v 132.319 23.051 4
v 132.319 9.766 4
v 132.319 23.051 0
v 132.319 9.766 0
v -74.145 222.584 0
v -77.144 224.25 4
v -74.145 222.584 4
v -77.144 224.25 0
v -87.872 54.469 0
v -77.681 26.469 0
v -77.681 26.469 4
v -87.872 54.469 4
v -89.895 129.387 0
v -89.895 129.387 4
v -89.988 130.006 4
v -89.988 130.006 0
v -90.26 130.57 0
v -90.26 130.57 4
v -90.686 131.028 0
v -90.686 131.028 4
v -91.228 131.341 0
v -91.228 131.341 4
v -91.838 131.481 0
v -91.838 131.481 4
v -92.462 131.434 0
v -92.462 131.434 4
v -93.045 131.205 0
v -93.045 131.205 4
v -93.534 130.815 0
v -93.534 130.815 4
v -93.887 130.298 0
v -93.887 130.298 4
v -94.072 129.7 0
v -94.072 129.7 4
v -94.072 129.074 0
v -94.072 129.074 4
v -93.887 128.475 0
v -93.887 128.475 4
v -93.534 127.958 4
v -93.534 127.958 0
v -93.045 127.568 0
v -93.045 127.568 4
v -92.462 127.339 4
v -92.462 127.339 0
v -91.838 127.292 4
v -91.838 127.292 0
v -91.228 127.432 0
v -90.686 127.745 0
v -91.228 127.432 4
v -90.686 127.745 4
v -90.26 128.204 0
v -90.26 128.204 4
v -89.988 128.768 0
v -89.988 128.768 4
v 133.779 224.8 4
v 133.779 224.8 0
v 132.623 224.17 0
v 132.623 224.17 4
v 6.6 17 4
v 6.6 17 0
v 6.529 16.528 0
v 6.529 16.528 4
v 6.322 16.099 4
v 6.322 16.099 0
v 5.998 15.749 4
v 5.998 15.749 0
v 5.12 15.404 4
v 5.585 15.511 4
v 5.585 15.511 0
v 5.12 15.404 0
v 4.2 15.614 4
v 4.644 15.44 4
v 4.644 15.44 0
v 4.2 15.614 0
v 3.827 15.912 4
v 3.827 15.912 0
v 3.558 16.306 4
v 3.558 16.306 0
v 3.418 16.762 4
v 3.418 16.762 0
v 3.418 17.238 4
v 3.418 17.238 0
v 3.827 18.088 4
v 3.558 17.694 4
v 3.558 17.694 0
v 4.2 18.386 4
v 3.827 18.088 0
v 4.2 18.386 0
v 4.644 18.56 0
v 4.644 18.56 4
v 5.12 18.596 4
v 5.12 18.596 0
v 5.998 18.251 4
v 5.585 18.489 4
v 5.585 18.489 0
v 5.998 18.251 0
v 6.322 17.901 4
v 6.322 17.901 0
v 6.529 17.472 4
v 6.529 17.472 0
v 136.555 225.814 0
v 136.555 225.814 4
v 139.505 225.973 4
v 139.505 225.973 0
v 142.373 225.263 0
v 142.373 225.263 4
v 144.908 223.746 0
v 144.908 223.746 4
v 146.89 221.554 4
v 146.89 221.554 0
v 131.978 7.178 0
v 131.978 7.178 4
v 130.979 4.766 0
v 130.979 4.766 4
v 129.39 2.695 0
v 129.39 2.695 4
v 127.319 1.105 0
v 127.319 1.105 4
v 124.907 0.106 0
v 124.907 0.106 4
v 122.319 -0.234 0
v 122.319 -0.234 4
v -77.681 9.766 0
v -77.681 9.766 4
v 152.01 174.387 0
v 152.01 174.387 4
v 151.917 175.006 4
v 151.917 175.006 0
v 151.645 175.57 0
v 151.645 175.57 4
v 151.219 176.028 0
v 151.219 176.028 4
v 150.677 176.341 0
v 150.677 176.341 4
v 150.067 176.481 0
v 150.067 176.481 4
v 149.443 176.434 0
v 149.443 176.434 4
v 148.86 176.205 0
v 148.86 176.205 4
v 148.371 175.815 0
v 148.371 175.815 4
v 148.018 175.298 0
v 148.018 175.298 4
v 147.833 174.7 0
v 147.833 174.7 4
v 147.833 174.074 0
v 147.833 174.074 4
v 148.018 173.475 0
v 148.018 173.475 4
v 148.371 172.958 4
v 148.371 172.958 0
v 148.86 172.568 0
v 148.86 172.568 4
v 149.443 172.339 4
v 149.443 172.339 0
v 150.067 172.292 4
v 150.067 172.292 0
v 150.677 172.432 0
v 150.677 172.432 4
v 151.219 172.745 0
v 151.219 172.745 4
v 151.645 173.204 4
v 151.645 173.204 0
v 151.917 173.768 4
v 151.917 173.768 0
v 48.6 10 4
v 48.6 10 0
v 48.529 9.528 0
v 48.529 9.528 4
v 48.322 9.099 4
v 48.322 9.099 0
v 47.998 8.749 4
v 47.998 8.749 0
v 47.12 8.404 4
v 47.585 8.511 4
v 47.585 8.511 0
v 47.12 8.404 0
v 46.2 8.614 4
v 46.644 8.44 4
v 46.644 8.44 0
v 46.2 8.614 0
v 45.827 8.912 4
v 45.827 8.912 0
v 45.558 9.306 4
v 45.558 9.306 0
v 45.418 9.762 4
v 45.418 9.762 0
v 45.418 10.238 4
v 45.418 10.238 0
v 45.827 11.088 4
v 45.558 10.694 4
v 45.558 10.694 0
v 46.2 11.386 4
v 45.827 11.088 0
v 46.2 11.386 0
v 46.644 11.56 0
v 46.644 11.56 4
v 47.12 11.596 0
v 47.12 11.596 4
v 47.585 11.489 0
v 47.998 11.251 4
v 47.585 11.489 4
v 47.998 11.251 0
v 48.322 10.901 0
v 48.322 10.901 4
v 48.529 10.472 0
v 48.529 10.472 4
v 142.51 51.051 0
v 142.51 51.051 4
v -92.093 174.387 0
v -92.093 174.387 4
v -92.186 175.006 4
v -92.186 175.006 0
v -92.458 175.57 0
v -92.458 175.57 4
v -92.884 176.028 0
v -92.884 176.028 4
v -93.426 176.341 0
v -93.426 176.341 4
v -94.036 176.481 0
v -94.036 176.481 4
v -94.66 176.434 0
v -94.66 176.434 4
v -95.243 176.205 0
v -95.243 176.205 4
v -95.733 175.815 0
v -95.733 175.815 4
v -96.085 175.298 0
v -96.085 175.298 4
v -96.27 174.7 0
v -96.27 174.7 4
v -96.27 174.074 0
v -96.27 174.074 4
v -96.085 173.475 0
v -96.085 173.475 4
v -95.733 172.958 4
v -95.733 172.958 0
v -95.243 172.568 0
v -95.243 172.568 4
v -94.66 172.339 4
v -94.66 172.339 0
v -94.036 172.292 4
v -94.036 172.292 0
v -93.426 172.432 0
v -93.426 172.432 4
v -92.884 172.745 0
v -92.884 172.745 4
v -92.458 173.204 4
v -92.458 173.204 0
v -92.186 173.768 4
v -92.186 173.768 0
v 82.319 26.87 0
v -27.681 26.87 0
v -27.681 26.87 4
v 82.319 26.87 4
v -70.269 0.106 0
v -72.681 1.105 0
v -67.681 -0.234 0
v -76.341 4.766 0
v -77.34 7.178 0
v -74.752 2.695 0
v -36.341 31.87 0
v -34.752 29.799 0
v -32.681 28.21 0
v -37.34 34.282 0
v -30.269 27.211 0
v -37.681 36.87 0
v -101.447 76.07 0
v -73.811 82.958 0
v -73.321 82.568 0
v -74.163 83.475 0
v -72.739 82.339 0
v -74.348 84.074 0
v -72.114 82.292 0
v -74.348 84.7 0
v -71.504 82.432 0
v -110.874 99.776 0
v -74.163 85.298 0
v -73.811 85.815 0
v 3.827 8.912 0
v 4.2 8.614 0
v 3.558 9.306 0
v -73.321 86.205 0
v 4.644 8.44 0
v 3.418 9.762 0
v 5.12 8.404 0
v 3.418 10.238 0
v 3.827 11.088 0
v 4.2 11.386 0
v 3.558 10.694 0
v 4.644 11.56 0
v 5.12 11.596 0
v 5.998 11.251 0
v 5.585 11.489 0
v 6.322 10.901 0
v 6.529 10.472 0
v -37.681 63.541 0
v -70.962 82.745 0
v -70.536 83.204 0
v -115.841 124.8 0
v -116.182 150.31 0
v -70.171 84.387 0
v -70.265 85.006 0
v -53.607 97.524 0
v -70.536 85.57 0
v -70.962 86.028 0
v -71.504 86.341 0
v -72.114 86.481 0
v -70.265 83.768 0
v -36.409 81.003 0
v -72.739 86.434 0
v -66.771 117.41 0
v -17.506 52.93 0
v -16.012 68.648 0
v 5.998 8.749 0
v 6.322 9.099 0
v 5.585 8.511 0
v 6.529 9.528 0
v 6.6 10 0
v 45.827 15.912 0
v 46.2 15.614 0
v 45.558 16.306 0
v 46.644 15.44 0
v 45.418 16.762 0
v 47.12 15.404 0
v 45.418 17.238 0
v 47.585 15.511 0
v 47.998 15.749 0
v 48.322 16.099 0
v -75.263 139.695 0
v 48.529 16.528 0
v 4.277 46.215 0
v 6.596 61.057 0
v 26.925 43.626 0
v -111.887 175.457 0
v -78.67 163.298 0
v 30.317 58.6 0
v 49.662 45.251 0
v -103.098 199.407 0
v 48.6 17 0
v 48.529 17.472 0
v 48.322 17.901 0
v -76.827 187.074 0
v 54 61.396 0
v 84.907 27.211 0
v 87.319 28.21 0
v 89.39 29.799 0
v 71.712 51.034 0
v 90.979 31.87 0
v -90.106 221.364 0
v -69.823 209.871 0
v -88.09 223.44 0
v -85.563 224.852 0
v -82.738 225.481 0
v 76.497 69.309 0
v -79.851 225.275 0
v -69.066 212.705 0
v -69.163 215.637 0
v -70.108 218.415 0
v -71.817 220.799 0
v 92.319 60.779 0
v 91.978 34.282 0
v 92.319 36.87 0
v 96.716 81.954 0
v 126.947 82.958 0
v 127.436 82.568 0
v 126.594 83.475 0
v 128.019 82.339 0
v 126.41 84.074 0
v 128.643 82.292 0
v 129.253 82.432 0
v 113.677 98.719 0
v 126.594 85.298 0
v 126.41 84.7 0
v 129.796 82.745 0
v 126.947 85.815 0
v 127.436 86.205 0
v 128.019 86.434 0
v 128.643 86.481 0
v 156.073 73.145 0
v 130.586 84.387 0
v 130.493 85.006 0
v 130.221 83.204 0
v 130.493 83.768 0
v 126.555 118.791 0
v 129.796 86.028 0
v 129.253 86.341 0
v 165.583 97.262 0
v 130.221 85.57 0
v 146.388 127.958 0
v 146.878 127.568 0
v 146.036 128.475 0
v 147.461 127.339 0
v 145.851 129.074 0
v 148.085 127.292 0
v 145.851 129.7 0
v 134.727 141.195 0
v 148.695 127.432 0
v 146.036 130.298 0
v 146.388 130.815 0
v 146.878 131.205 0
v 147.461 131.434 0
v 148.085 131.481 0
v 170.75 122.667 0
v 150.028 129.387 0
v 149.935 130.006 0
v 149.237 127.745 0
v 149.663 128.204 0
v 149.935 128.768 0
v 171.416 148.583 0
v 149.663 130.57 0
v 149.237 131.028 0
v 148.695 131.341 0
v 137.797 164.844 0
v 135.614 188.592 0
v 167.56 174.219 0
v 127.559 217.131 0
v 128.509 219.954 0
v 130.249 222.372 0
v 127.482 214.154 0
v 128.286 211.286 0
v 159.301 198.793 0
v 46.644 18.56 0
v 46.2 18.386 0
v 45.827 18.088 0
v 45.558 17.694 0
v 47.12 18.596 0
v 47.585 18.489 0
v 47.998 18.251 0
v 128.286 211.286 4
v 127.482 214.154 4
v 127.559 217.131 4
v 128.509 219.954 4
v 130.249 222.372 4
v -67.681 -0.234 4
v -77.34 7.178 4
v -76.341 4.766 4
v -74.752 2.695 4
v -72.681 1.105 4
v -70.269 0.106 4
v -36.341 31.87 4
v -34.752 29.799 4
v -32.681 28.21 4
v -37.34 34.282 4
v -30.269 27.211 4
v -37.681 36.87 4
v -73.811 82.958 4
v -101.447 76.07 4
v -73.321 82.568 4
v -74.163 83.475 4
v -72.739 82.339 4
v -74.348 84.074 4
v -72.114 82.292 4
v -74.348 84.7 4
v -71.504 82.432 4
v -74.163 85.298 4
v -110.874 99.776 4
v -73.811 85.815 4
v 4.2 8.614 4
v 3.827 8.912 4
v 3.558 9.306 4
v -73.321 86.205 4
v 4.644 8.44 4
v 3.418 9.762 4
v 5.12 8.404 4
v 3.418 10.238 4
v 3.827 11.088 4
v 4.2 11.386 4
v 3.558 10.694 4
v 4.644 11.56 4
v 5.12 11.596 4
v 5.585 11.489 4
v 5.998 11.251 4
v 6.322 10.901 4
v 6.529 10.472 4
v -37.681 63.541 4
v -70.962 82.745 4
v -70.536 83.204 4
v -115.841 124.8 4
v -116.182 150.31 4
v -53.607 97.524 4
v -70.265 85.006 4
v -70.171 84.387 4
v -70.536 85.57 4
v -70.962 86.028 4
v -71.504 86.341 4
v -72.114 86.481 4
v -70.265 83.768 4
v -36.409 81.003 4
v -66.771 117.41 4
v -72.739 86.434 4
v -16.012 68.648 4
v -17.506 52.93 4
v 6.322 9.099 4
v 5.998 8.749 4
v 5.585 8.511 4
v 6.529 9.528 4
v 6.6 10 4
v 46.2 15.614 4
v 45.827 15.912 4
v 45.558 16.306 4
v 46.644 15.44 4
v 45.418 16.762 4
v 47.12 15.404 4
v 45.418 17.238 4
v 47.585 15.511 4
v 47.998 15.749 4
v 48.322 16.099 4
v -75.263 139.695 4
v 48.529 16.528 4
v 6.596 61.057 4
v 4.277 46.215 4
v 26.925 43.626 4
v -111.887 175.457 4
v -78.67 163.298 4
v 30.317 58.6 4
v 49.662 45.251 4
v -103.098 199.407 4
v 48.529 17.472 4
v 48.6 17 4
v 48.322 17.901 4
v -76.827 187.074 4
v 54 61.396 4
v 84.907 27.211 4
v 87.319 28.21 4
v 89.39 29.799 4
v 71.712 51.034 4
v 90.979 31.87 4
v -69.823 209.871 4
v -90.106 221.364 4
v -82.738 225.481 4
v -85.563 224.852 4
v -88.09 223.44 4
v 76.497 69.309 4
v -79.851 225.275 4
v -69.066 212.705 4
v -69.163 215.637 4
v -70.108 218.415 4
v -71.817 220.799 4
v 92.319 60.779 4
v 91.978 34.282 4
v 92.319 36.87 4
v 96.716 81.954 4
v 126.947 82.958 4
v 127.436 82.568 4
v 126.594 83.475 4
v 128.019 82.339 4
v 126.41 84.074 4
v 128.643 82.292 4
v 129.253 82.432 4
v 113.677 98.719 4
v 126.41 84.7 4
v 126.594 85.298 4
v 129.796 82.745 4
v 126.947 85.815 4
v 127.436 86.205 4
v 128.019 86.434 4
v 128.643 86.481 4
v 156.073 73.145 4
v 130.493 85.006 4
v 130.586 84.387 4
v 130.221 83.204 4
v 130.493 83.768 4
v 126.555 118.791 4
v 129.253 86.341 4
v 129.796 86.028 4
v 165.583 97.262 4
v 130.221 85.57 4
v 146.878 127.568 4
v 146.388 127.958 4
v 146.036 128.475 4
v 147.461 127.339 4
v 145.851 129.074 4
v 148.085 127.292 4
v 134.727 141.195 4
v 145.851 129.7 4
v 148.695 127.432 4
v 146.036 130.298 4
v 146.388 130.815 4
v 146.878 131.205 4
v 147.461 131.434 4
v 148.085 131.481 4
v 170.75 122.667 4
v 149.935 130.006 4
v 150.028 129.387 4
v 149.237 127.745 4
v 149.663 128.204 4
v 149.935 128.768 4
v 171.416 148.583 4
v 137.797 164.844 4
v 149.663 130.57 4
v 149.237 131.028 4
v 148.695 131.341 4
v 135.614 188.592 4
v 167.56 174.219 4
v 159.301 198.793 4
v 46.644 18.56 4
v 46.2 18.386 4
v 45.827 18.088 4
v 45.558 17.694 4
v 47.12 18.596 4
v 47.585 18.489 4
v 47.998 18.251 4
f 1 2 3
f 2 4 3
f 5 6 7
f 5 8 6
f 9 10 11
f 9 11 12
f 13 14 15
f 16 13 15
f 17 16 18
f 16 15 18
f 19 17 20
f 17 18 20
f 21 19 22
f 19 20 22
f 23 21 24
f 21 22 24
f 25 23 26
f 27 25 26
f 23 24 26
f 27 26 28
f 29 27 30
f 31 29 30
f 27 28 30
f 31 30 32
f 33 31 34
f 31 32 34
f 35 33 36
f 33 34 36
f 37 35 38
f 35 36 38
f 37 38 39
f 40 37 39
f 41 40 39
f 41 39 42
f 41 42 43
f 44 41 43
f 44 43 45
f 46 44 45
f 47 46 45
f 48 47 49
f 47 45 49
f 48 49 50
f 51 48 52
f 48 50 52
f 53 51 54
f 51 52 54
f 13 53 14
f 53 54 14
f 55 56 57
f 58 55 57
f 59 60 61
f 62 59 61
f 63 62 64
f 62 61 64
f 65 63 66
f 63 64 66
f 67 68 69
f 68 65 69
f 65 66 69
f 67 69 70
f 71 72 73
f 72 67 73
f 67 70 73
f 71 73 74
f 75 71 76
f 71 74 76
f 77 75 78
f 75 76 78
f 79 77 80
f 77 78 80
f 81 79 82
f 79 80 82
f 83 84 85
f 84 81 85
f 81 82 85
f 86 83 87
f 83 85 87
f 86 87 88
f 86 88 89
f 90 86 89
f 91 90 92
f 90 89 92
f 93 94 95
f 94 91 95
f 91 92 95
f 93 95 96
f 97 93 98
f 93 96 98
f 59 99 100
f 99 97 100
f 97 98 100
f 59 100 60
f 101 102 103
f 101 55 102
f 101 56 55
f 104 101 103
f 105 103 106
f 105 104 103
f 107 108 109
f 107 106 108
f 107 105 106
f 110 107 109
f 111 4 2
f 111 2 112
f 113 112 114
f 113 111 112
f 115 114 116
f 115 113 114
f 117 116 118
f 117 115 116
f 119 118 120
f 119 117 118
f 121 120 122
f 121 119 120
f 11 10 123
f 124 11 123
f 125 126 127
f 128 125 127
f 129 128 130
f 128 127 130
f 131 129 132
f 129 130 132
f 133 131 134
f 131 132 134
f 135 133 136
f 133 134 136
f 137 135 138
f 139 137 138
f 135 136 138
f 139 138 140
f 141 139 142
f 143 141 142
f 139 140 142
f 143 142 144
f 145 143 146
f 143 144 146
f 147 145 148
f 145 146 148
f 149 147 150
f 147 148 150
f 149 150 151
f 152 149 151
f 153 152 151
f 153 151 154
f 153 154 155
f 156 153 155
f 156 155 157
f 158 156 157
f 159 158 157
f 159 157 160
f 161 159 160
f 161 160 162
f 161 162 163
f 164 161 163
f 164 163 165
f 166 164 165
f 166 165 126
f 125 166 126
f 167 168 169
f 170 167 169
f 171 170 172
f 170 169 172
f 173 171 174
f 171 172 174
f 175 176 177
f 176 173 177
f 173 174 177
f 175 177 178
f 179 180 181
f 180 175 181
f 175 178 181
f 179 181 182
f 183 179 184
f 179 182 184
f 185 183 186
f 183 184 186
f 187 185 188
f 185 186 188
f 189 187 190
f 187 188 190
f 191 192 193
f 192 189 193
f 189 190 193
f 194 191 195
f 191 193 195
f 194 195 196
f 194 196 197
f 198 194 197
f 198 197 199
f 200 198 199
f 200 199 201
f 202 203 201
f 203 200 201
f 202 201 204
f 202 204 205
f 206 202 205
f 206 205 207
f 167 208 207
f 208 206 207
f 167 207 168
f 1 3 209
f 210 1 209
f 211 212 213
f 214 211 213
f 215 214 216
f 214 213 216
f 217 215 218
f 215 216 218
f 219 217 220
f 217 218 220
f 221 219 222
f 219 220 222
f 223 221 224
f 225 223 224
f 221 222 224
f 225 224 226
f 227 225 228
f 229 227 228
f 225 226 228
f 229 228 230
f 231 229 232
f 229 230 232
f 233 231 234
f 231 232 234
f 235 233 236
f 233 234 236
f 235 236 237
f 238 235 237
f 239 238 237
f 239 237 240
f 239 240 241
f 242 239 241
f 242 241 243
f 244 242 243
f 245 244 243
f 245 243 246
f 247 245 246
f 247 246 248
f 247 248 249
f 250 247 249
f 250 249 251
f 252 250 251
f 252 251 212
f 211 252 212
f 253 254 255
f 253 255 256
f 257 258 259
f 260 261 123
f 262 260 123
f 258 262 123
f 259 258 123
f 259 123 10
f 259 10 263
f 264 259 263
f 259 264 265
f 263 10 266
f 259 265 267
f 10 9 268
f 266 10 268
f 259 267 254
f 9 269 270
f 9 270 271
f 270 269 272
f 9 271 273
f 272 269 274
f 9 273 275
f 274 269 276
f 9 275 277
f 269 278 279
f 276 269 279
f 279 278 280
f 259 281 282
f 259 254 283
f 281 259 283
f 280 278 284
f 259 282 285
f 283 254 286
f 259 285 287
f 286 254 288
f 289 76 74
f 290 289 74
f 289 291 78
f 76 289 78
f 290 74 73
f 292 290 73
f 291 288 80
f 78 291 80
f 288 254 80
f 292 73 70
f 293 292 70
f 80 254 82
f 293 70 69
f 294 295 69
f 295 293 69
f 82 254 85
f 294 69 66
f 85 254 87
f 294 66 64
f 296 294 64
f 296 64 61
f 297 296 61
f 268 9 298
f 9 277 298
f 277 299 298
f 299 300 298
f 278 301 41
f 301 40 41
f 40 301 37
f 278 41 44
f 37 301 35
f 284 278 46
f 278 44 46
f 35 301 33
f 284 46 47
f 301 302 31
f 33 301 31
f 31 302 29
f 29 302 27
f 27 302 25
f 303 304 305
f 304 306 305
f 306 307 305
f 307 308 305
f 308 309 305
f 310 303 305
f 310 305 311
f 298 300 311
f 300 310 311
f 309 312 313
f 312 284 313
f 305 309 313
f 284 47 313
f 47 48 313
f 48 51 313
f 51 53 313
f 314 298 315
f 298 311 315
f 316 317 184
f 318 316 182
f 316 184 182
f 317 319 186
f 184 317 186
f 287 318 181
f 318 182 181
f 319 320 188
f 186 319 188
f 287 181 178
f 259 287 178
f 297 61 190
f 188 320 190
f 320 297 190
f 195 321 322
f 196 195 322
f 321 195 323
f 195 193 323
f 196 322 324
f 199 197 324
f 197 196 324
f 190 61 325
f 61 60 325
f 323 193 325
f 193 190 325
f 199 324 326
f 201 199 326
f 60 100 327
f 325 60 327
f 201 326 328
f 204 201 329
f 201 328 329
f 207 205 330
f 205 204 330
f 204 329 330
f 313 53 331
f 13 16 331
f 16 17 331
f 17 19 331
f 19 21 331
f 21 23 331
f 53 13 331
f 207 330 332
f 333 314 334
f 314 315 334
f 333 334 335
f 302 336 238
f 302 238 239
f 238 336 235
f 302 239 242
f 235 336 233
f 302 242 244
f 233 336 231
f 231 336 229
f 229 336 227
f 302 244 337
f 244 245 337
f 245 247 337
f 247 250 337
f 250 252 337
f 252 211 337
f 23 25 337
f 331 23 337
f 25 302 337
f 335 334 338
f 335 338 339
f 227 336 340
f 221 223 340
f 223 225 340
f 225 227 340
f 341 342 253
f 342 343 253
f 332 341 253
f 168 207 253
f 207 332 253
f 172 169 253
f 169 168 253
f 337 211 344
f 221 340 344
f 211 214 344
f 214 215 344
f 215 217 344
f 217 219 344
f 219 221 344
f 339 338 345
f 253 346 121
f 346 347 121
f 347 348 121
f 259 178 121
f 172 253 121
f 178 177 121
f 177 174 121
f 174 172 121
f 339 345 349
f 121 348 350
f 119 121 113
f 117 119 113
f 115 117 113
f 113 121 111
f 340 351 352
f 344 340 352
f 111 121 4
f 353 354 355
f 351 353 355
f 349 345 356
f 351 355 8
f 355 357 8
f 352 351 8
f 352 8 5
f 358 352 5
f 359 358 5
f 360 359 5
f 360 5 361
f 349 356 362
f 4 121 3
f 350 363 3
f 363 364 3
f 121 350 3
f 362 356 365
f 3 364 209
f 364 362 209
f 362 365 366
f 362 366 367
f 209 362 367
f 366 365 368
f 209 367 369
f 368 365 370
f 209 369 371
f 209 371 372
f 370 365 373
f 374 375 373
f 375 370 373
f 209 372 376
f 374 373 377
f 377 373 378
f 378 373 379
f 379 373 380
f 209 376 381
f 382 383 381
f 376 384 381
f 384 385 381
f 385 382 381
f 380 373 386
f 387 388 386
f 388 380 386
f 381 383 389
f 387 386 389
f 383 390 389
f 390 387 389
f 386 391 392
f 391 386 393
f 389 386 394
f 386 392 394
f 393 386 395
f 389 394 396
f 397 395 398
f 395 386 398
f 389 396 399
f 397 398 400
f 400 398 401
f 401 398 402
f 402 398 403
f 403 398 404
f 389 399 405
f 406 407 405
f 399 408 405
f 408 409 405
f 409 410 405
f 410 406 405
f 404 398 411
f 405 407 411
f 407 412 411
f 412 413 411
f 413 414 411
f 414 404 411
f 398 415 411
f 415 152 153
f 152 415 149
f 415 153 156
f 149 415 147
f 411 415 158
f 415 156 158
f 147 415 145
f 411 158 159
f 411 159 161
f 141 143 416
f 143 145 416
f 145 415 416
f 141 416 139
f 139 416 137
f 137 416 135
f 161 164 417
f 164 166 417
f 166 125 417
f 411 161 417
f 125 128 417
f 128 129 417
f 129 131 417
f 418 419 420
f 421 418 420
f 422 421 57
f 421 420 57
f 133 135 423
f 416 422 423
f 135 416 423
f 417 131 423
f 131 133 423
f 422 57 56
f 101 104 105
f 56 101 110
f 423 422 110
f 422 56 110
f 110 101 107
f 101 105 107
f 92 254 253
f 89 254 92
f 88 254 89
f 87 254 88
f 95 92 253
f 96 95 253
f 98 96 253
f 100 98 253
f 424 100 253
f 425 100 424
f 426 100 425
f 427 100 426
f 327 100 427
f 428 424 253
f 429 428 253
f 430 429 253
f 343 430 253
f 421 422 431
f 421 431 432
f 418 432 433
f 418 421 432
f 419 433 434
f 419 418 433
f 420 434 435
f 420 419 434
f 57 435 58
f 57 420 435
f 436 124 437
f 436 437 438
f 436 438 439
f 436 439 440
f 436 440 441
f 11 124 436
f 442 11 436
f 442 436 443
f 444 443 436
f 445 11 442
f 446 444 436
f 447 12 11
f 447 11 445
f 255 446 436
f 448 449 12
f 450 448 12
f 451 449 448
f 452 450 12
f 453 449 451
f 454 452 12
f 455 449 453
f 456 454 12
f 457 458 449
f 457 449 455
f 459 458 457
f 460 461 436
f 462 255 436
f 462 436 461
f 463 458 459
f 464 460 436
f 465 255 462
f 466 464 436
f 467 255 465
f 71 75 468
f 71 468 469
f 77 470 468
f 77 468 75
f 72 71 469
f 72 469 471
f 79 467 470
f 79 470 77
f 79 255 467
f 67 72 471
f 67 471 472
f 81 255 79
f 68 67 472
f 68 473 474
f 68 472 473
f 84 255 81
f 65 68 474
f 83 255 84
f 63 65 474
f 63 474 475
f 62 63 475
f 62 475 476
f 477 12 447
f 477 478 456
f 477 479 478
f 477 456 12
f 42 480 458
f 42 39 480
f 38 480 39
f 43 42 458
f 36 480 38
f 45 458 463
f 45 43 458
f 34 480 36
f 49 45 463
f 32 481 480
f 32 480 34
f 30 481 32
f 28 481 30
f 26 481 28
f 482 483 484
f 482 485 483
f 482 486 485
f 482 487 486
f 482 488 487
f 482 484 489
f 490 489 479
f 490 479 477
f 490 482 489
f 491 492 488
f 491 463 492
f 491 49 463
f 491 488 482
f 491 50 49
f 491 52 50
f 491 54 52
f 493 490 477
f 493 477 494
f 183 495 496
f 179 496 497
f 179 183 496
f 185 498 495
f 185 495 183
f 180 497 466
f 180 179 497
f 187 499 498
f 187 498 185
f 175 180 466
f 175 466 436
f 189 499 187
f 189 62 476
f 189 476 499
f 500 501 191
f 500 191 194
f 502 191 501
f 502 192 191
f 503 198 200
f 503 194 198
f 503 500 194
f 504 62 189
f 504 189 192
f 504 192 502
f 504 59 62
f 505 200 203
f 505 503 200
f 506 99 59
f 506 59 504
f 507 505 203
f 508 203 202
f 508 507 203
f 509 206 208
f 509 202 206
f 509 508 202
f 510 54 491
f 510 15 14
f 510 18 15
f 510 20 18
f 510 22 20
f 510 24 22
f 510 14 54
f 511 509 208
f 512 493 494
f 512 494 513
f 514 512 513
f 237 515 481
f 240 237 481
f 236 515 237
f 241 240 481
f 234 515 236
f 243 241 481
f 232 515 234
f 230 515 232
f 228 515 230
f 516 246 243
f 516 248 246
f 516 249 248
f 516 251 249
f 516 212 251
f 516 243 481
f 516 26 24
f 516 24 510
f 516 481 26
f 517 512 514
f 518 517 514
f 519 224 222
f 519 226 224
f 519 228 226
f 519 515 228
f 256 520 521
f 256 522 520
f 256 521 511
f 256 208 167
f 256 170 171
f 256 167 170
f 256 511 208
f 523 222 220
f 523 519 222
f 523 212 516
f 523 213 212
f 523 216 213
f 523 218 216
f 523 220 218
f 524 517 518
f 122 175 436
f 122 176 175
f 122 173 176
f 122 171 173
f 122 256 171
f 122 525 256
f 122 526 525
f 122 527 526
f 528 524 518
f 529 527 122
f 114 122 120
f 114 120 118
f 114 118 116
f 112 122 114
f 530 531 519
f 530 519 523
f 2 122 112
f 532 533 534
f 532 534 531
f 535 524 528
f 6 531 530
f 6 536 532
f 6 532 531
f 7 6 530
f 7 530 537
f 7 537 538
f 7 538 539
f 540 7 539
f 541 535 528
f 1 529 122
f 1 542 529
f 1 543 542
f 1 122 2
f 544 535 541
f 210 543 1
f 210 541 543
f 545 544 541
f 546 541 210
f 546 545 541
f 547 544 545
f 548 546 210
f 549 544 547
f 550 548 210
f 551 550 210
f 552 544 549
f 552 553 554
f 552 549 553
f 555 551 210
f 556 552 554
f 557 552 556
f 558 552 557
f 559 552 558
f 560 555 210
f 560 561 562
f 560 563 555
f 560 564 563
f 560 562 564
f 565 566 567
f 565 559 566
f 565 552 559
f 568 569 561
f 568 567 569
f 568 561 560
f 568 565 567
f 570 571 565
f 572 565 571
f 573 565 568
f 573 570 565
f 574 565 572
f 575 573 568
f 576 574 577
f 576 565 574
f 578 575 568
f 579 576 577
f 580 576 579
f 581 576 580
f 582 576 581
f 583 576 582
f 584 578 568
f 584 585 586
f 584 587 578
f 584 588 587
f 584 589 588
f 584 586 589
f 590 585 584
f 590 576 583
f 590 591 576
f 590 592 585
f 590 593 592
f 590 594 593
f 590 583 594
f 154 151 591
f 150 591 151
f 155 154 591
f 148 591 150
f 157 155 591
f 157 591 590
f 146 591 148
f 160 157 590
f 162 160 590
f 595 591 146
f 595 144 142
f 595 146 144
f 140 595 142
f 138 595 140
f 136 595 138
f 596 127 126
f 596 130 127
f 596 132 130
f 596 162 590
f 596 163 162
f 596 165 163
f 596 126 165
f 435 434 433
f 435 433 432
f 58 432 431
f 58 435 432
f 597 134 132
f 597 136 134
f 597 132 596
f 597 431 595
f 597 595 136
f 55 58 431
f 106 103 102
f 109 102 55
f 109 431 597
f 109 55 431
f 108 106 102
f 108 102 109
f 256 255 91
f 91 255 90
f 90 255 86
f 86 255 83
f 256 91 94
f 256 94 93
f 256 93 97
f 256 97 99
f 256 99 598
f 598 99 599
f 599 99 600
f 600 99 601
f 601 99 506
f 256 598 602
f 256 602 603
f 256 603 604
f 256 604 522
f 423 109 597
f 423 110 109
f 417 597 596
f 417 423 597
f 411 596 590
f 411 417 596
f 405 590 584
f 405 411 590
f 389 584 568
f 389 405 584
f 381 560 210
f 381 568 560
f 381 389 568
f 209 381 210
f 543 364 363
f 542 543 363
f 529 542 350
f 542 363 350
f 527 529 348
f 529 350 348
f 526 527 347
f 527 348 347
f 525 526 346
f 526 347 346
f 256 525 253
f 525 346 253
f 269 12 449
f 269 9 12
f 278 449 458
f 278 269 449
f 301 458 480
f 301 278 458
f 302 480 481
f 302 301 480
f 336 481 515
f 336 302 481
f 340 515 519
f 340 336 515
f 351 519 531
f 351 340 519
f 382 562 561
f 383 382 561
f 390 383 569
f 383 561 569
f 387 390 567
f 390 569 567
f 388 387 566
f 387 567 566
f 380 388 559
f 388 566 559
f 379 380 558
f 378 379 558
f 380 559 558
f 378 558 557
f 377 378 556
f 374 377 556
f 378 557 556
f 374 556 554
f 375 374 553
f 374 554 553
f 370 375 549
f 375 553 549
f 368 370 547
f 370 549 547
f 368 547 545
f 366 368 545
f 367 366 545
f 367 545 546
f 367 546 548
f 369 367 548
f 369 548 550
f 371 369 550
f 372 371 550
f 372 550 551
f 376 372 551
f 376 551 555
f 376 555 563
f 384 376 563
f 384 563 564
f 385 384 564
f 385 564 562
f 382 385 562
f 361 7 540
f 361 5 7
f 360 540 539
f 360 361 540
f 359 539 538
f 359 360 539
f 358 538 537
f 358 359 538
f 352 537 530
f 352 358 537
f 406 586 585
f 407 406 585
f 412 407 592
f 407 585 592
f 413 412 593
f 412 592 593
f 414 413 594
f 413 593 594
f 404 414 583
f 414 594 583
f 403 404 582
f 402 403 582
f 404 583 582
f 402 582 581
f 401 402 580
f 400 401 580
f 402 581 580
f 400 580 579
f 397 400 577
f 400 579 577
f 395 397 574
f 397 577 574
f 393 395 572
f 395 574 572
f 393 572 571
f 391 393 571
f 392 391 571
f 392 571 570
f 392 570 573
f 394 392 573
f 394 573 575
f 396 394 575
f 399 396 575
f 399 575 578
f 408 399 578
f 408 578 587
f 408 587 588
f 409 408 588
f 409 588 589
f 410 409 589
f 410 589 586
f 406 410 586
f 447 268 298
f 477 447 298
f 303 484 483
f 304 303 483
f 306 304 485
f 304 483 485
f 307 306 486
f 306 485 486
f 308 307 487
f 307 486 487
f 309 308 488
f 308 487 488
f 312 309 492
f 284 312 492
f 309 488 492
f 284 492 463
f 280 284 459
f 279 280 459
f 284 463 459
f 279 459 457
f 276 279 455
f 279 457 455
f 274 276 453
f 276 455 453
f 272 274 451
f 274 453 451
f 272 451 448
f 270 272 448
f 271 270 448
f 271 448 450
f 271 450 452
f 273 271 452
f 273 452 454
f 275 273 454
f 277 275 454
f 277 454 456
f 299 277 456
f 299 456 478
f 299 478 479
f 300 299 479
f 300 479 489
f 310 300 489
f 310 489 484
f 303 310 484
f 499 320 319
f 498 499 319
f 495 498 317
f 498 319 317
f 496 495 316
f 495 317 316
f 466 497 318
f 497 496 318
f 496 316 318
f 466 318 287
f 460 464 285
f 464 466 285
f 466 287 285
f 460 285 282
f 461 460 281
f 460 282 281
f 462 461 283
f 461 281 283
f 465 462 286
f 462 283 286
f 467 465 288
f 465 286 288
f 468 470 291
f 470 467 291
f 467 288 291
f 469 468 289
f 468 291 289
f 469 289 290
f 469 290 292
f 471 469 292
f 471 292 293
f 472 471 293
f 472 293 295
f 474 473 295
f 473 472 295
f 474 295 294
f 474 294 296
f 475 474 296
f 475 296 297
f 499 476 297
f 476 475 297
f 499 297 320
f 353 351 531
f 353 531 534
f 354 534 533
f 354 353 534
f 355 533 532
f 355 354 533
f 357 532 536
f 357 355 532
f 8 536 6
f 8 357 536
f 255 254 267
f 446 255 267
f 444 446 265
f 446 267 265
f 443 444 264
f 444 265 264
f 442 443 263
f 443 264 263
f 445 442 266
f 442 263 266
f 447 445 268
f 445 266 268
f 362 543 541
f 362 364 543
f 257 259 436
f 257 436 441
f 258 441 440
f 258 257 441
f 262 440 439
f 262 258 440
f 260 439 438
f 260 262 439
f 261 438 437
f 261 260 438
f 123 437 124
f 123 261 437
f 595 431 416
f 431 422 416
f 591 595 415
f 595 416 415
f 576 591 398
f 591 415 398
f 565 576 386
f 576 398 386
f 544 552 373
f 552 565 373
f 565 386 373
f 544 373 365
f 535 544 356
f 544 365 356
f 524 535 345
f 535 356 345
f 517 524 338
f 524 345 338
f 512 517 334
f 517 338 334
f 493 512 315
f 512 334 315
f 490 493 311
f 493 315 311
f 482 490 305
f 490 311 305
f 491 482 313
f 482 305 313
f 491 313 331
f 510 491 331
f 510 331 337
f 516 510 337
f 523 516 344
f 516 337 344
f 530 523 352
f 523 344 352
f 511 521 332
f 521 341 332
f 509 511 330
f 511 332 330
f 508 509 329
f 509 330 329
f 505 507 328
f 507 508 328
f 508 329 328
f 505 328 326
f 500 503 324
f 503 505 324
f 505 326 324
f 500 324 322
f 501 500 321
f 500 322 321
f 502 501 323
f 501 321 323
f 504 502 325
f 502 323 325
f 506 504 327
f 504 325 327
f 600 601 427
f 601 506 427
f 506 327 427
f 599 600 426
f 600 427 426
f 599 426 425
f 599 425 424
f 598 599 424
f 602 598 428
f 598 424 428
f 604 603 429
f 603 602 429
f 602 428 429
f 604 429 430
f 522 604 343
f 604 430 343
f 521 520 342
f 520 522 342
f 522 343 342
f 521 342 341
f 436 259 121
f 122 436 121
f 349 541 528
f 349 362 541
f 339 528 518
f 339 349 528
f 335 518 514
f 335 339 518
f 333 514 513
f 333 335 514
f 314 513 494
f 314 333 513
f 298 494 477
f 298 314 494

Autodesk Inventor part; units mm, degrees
ref_plane "YZ Plane" through (0, 0, 0) normal (1, 0, 0) x (0, 1, 0)
ref_plane "XZ Plane" through (0, 0, 0) normal (0, 1, 0) x (-1, 0, 0)
ref_plane "XY Plane" through (0, 0, 0) normal (0, 0, 1) x (1, 0, 0)
sketch "Эскиз1" plane through (0, 0, 0) normal (0, 0, 1) x (1, 0, 0)
  line L0 (12, 4) -> (40, 4) construction
  line L1 (0, 0) -> (52, 0) construction
  line L2 (-67.6811, -0.2343) -> (32.3189, -0.2343)
  line L3 (132.3189, 9.7657) -> (132.3189, 23.0512)
  line L4 (-77.6811, 26.4691) -> (-77.6811, 9.7657)
  line L5 (-77.6811, 26.4691) -> (-87.8723, 54.4691)
  line L6 (132.3189, 23.0512) -> (142.51, 51.0512)
  arc A0 (142.51, 51.0512) -> (146.8898, 221.5537) centre (23.3362, 139.42) ccw
  arc A1 (-90.1063, 221.3637) -> (-87.8723, 54.4691) centre (23.3362, 139.42) ccw
  arc A2 (-69.8234, 209.8708) -> (128.2861, 211.2859) centre (29.5436, 166.8699) ccw
  line L7 (-77.1442, 224.2501) -> (-74.1451, 222.5843)
  line L8 (133.7794, 224.7999) -> (132.6234, 224.1703)
  line L9 (-27.6811, 26.8699) -> (82.3189, 26.8699)
  line L10 (32.3189, -0.2343) -> (122.3189, -0.2343)
  line L11 (-37.6811, 36.8699) -> (-37.6811, 63.541)
  line L12 (92.3189, 36.8699) -> (92.3189, 60.779)
  arc A3 (-37.6811, 63.541) -> (92.3189, 60.779) centre (29.5436, 166.8699) ccw
  arc A4 (-37.6811, 36.8699) -> (-27.6811, 26.8699) centre (-27.6811, 36.8699) ccw
  arc A5 (82.3189, 26.8699) -> (92.3189, 36.8699) centre (82.3189, 36.8699) ccw
  arc A6 (-69.8234, 209.8708) -> (-74.1451, 222.5843) centre (-79.0009, 213.8423) ccw
  arc A7 (-77.1442, 224.2501) -> (-90.1063, 221.3637) centre (-82, 215.5082) ccw
  arc A8 (132.6234, 224.1703) -> (128.2861, 211.2859) centre (137.4059, 215.3881) ccw
  arc A9 (146.8898, 221.5537) -> (133.7794, 224.7999) centre (138.562, 216.0177) ccw
  circle A10 centre (5, 17) radius 1.6 projected
  circle A11 centre (5, 10) radius 1.6 projected
  circle A12 centre (47, 10) radius 1.6 projected
  circle A13 centre (47, 17) radius 1.6 projected
  arc A14 (-77.6811, 9.7657) -> (-67.6811, -0.2343) centre (-67.6811, 9.7657) ccw
  arc A15 (122.3189, -0.2343) -> (132.3189, 9.7657) centre (122.3189, 9.7657) ccw
  point P0 (-77.6811, -0.2343)
  point P1 (132.3189, -0.2343)
  point P2 (141.7652, 229.1487)
  point P3 (-65.8946, 218.0014)
  point P4 (26, 0)
  point P5 (77.3189, -0.2343)
  point P6 (-77.6811, 18.1174)
  point P7 (-37.6811, 50.2054)
  point P8 (132.3189, 16.4085)
  point P9 (92.3189, 48.8244)
  dimension "d21" = 167.1042
  dimension "d22" = 10
  dimension "d23" = 10
  dimension "d28" = 100
  dimension "d29" = 15
  dimension "d32" = 140
  dimension "d33" = 10
  dimension "d43" = 100
  dimension "d44" = 40
  dimension "d45" = 40
  dimension "d46" = 28
  dimension "d47" = 28
  dimension "d48" = 20
  dimension "d49" = 20
extrude "Выдавливание1" add sketch "Эскиз1" along normal blind 4
sketch "Эскиз2" plane through (0, 0, 4) normal (0, 0, 1) x (1, 0, 0)
  arc A0 (-77.1442, 224.2501) -> (-90.1063, 221.3637) centre (-82, 215.5082) ccw construction
  line L0 (-37.6811, 36.8699) -> (-37.6811, 63.541) construction
  arc A1 (-77.1442, 224.2501) -> (-37.6811, 50.2054) centre (34.7868, 158.1332) ccw construction
  circle A2 centre (-91.995, 129.3866) radius 2.1
  circle A3 centre (-72.2713, 84.3866) radius 2.1
  circle A4 centre (-94.1931, 174.3866) radius 2.1
  line L1 (-67.6811, -0.2343) -> (122.3189, -0.2343) construction
  circle A5 centre (5, 10) radius 1.6 construction
  circle A6 centre (47, 10) radius 1.6 construction
  line L2 (5, 10) -> (47, 10) construction
  line L3 (26, 10) -> (26, 211.5399) construction
  line L4 (92.3189, 60.779) -> (92.3189, 36.8699) projected
  arc A7 (132.6234, 224.1703) -> (128.2861, 211.2859) centre (137.4059, 215.3881) ccw projected
  arc A8 (92.3189, 48.8244) -> (132.6234, 224.1703) centre (21.0087, 157.5206) ccw construction
  line L5 (-72.2713, 84.3866) -> (128.4862, 84.3866) construction
  circle A9 centre (128.4862, 84.3866) radius 2.1
  line L6 (-91.995, 129.3866) -> (161.5686, 129.3866) construction
  circle A10 centre (147.9279, 129.3866) radius 2.1
  line L7 (-94.1931, 174.3866) -> (161.5686, 174.3866) construction
  circle A11 centre (149.91, 174.3866) radius 2.1
  point P0 (0, 0)
  dimension "d35" = 4.2
  dimension "d36" = 4.2
  dimension "d37" = 45
  dimension "d38" = 4.2
  dimension "d39" = 45
  dimension "d50" = 130
  dimension "d51" = 130
  dimension "d52" = 4.2
  dimension "d53" = 4.2
  dimension "d54" = 4.2
extrude "Выдавливание2" cut sketch "Эскиз2" against normal blind 4
properties part number "фанера_ухо"
